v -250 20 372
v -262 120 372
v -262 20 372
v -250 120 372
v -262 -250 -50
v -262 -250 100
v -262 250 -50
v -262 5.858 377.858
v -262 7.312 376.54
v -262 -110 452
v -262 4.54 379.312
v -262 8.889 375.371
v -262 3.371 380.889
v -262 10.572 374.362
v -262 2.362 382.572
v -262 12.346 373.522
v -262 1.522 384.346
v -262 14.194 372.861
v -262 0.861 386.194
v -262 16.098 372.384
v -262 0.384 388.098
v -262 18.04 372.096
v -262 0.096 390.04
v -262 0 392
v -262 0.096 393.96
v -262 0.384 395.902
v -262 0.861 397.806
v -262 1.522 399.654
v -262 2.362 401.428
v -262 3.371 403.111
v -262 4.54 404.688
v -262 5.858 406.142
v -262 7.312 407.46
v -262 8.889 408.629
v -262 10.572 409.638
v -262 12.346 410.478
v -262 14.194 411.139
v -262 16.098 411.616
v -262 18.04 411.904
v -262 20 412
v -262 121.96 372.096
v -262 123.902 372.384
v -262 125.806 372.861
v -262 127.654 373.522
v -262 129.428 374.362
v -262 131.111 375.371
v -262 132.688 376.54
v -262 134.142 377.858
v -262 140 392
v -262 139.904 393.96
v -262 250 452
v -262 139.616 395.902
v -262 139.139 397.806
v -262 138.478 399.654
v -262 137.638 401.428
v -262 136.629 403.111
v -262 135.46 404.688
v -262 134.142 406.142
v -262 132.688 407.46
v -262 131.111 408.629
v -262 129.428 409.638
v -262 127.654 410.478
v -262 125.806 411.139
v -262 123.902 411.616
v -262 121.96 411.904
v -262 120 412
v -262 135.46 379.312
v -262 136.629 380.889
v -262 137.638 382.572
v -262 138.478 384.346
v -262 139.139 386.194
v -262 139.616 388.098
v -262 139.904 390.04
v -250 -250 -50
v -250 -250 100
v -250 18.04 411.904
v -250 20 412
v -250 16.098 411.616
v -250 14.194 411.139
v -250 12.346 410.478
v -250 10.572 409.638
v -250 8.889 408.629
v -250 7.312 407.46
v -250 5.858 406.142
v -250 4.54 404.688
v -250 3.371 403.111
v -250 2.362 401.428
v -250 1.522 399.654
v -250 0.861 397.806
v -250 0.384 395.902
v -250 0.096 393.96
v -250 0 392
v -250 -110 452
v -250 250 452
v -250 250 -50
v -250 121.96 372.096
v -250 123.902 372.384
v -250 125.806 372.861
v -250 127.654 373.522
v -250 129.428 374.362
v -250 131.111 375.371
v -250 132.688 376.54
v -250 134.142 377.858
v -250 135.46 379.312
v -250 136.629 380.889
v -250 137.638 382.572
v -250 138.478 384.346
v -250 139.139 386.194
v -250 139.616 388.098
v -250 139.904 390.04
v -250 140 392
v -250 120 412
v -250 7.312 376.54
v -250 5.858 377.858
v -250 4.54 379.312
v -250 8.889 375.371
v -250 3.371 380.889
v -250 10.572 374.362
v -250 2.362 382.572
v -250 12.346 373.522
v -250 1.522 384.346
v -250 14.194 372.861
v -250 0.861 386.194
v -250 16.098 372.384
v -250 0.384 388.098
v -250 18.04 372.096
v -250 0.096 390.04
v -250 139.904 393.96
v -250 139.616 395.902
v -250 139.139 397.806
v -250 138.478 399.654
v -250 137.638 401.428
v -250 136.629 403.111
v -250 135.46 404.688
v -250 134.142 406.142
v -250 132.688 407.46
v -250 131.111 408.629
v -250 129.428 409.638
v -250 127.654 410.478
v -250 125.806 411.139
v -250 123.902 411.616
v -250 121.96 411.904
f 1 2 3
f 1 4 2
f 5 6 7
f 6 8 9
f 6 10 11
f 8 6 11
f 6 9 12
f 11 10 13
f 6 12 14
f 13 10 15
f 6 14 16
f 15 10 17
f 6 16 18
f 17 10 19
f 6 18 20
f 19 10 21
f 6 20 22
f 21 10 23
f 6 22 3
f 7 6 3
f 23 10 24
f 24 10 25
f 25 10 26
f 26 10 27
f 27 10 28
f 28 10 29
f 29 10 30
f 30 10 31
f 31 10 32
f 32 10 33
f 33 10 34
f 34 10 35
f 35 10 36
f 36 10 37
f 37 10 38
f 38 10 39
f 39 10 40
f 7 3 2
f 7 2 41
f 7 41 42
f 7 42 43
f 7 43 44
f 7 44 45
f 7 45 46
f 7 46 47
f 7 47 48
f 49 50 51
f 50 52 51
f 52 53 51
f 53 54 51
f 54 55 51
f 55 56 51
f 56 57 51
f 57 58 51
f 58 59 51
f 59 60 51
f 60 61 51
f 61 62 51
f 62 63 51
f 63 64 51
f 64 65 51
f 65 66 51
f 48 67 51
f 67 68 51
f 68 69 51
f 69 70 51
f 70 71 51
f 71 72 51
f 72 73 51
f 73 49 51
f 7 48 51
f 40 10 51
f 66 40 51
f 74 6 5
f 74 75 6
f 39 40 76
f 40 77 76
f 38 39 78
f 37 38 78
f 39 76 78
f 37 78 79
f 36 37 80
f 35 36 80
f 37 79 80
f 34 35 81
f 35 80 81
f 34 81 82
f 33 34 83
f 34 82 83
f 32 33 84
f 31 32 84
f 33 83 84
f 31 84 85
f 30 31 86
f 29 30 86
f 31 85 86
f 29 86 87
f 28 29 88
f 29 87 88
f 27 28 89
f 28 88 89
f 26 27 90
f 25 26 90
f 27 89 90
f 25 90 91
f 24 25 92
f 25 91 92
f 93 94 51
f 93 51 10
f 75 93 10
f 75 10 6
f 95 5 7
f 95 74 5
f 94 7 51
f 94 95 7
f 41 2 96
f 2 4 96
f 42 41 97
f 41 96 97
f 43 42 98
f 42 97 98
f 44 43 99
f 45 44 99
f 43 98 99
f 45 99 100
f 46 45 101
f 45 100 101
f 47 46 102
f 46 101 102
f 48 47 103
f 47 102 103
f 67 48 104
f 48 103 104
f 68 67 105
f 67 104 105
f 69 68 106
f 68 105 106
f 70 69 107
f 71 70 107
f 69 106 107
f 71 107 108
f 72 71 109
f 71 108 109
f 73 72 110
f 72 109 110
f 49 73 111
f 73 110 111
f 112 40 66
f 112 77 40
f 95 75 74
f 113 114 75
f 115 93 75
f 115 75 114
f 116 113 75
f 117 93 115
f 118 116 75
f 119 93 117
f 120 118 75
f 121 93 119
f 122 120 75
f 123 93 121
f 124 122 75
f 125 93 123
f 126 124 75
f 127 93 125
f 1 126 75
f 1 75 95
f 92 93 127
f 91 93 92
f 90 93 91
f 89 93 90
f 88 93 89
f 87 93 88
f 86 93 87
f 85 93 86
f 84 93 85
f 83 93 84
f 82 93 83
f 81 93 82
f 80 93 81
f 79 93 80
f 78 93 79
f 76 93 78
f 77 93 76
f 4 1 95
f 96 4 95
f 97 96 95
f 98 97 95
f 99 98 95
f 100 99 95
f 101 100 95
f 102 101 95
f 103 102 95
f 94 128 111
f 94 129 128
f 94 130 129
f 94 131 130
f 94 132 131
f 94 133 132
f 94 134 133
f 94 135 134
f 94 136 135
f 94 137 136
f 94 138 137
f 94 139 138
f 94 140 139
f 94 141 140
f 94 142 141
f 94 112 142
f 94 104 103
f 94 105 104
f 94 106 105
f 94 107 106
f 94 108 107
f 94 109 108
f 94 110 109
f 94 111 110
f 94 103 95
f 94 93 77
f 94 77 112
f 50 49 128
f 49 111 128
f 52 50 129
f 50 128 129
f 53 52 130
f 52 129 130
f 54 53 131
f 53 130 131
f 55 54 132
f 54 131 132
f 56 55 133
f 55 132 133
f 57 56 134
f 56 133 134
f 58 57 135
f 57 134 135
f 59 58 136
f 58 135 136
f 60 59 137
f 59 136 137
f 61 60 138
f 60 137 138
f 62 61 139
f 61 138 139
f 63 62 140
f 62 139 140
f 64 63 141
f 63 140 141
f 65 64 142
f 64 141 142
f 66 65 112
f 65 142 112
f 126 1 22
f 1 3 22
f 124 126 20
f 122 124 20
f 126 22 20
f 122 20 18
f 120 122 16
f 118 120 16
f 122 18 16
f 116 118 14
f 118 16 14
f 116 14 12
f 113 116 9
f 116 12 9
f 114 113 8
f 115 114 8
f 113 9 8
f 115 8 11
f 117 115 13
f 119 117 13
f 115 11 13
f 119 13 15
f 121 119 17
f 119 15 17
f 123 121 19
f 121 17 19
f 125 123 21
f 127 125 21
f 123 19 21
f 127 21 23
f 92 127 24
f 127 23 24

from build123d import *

# Parameters (mm, degrees)
F0_W      = 500
F0_H      = 500
F1_DEPTH  = 12
F2_W      = 500
F2_H      = 50
F3_DEPTH  = 6
F6_DEPTH  = 6
F14_DEPTH = 6
F15_R     = 19.99999
F19_DEPTH = 6
F22_DEPTH = 12
F25_DEPTH = 6
F27_W     = 12
F27_H     = 320
F28_DEPTH = 44
F31_W     = 196
F31_H     = 12
F32_DEPTH = 44
F37_DEPTH = 3
F43_DEPTH = 12


# Not quite as in the source:
# - a fillet or chamfer is up to 0.001 mm smaller than in the source, because OpenCascade refuses the exact size


with BuildPart() as f1:
    # F0 (on Top) → F1 (new body)
    with BuildSketch(Plane.XY):
        Rectangle(F0_W, F0_H)
    extrude(amount=F1_DEPTH)


with BuildPart() as f3:
    # F2 (on Right) → F3 (new body, symmetric)
    with BuildSketch(Plane.YZ):
        Rectangle(F2_W, F2_H)
    extrude(amount=F3_DEPTH, both=True)


with BuildPart() as f3_1:
    # F4: moved
    add(f3.part.moved(Location((0, 0, -25))))


with BuildPart() as f6:
    # F5 (on Front) → F6 (new body, symmetric)
    with BuildSketch(Plane.XZ):
        Polygon((-250, -25), (250, -25), (250, 25), (6, 25), (6, 0), (-6, 0), (-6, 25), (-250, 25), align=None)
    extrude(amount=F6_DEPTH, both=True)


with BuildPart() as f6_1:
    # F7: moved
    add(f6.part.moved(Location((0, 80, -25))))


with BuildPart() as f8_1:
    # F8: copy of F6
    add(f6_1.part)


with BuildPart() as f3_2:
    add(f3_1.part)

    # F10: cut F6
    add(f6_1.part, mode=Mode.SUBTRACT)


with BuildPart() as f11_1:
    # F11: copy of F6
    add(f6_1.part.moved(Location((0, 164, 0))))


with BuildPart() as f3_3:
    add(f3_2.part)

    # F12: cut F11_1
    add(f11_1.part, mode=Mode.SUBTRACT)


with BuildPart() as f14:
    # F13 (on Right) → F14 (new body, symmetric)
    with BuildSketch(Plane.YZ):
        Polygon((250, -50), (250, 0), (250, 452), (70, 452), (-110, 452), (-250, 100), (-250, -50), align=None)
        Polygon((0, 412), (70, 412), (140, 412), (140, 372), (0, 372), align=None, mode=Mode.SUBTRACT)
    extrude(amount=F14_DEPTH, both=True)

    # F15 (radius 20 in the source; OpenCascade refuses exactly that, so slightly less here)
    f15_edges = [f14.edges().sort_by_distance(p)[0] for p in [
        (0, 140, 372),
        (0, 140, 412),
        (0, 0, 412),
        (0, 0, 372),
    ]]
    fillet(f15_edges, radius=F15_R)


with BuildPart() as f14_1:
    # F16: moved
    add(f14.part.moved(Location((-256, 0, 0))))


with BuildPart() as f17_1:
    # F17: copy of F14
    add(f14_1.part.moved(Location((512, 0, 0))))


with BuildPart() as f19:
    # F18 (on Front) → F19 (new body, symmetric)
    with BuildSketch(Plane.XZ):
        Polygon((-262, 452), (-262, 0), (-262, -50), (262, -50), (262, 452), align=None)
    extrude(amount=F19_DEPTH, both=True)


with BuildPart() as f19_1:
    # F20: moved
    add(f19.part.moved(Location((0, 256, 0))))


with BuildPart() as f22:
    # F21 (on face) → F22 (new body)
    with BuildSketch(Plane.XY.offset(12)):
        Polygon((262, 262), (0, 262), (-262, 262), (-262, -110), (262, -110), align=None)
    extrude(amount=F22_DEPTH)


with BuildPart() as f22_1:
    # F23: moved
    add(f22.part.moved(Location((0, 0, 440))))


with BuildPart() as f25:
    # F24 (on Front) → F25 (new body, symmetric)
    with BuildSketch(Plane.XZ):
        Polygon((-250, 12), (0, 12), (250, 12), (250, 100), (-250, 100), align=None)
    extrude(amount=F25_DEPTH, both=True)


with BuildPart() as f25_1:
    # F26: moved
    add(f25.part.moved(Location((0, -244, 0))))


with BuildPart() as f28:
    # F27 (on Top) → F28 (new body)
    with BuildSketch(Plane.XY):
        with Locations((-24, -90)):
            Rectangle(F27_W, F27_H)
    extrude(amount=F28_DEPTH)


with BuildPart() as f28_1:
    # F29: moved
    add(f28.part.moved(Location((0, 0, -48))))


with BuildPart() as f30_1:
    # F30: copy of F28
    add(f28_1.part.moved(Location((-208, 0, 0))))


with BuildPart() as f32:
    # F31 (on Top) → F32 (new body)
    with BuildSketch(Plane.XY):
        with Locations((-128, -244)):
            Rectangle(F31_W, F31_H)
    extrude(amount=-F32_DEPTH)


with BuildPart() as f32_1:
    # F33: moved
    add(f32.part.moved(Location((0, 0, -4))))


with BuildPart() as f34_1:
    # F34: copy of F32
    add(f32_1.part.moved(Location((0, 308, 0))))


with BuildPart() as f35_1:
    # F35: copy of F32
    add(f32_1.part.moved(Location((256, 0, 0))))


with BuildPart() as f35_2:
    # F35: copy of F30_1
    add(f30_1.part.moved(Location((256, 0, 0))))


with BuildPart() as f35_3:
    # F35: copy of F28
    add(f28_1.part.moved(Location((256, 0, 0))))


with BuildPart() as f35_4:
    # F35: copy of F34_1
    add(f34_1.part.moved(Location((256, 0, 0))))


with BuildPart() as f37:
    # F36 (on Top) → F37 (new body)
    with BuildSketch(Plane.XY):
        Polygon((-24, -244), (-24, 0), (-24, 64), (-232, 64), (-232, -244), align=None)
    extrude(amount=F37_DEPTH)


with BuildPart() as f37_1:
    # F38: moved
    add(f37.part.moved(Location((0, 0, -44))))


with BuildPart() as f39_1:
    # F39: copy of F37
    add(f37_1.part.moved(Location((256, 0, 0))))


with BuildPart() as f30_1_1:
    add(f30_1.part)

    # F40: cut F37
    add(f37_1.part, mode=Mode.SUBTRACT)


with BuildPart() as f32_2:
    add(f32_1.part)

    # F40: cut F37
    add(f37_1.part, mode=Mode.SUBTRACT)


with BuildPart() as f28_2:
    add(f28_1.part)

    # F40: cut F37
    add(f37_1.part, mode=Mode.SUBTRACT)


with BuildPart() as f34_1_1:
    add(f34_1.part)

    # F40: cut F37
    add(f37_1.part, mode=Mode.SUBTRACT)


with BuildPart() as f35_1_1:
    add(f35_1.part)

    # F41: cut F39_1
    add(f39_1.part, mode=Mode.SUBTRACT)


with BuildPart() as f35_3_1:
    add(f35_3.part)

    # F41: cut F39_1
    add(f39_1.part, mode=Mode.SUBTRACT)


with BuildPart() as f35_4_1:
    add(f35_4.part)

    # F41: cut F39_1
    add(f39_1.part, mode=Mode.SUBTRACT)


with BuildPart() as f35_2_1:
    add(f35_2.part)

    # F41: cut F39_1
    add(f39_1.part, mode=Mode.SUBTRACT)


with BuildPart() as f43:
    # F42 (on Front) → F43 (new body)
    with BuildSketch(Plane.XZ):
        Polygon((0, 12), (0, 0), (0, -50), (262, -50), (262, 12), align=None)
    extrude(amount=F43_DEPTH)


with BuildPart() as f43_1:
    # F44: moved
    add(f43.part.moved(Location((0, -250, 0))))


with BuildPart() as f45_1:
    # F45: copy of F43
    add(f43_1.part.moved(Location((-262, 0, 0))))


solid = f14_1.part
